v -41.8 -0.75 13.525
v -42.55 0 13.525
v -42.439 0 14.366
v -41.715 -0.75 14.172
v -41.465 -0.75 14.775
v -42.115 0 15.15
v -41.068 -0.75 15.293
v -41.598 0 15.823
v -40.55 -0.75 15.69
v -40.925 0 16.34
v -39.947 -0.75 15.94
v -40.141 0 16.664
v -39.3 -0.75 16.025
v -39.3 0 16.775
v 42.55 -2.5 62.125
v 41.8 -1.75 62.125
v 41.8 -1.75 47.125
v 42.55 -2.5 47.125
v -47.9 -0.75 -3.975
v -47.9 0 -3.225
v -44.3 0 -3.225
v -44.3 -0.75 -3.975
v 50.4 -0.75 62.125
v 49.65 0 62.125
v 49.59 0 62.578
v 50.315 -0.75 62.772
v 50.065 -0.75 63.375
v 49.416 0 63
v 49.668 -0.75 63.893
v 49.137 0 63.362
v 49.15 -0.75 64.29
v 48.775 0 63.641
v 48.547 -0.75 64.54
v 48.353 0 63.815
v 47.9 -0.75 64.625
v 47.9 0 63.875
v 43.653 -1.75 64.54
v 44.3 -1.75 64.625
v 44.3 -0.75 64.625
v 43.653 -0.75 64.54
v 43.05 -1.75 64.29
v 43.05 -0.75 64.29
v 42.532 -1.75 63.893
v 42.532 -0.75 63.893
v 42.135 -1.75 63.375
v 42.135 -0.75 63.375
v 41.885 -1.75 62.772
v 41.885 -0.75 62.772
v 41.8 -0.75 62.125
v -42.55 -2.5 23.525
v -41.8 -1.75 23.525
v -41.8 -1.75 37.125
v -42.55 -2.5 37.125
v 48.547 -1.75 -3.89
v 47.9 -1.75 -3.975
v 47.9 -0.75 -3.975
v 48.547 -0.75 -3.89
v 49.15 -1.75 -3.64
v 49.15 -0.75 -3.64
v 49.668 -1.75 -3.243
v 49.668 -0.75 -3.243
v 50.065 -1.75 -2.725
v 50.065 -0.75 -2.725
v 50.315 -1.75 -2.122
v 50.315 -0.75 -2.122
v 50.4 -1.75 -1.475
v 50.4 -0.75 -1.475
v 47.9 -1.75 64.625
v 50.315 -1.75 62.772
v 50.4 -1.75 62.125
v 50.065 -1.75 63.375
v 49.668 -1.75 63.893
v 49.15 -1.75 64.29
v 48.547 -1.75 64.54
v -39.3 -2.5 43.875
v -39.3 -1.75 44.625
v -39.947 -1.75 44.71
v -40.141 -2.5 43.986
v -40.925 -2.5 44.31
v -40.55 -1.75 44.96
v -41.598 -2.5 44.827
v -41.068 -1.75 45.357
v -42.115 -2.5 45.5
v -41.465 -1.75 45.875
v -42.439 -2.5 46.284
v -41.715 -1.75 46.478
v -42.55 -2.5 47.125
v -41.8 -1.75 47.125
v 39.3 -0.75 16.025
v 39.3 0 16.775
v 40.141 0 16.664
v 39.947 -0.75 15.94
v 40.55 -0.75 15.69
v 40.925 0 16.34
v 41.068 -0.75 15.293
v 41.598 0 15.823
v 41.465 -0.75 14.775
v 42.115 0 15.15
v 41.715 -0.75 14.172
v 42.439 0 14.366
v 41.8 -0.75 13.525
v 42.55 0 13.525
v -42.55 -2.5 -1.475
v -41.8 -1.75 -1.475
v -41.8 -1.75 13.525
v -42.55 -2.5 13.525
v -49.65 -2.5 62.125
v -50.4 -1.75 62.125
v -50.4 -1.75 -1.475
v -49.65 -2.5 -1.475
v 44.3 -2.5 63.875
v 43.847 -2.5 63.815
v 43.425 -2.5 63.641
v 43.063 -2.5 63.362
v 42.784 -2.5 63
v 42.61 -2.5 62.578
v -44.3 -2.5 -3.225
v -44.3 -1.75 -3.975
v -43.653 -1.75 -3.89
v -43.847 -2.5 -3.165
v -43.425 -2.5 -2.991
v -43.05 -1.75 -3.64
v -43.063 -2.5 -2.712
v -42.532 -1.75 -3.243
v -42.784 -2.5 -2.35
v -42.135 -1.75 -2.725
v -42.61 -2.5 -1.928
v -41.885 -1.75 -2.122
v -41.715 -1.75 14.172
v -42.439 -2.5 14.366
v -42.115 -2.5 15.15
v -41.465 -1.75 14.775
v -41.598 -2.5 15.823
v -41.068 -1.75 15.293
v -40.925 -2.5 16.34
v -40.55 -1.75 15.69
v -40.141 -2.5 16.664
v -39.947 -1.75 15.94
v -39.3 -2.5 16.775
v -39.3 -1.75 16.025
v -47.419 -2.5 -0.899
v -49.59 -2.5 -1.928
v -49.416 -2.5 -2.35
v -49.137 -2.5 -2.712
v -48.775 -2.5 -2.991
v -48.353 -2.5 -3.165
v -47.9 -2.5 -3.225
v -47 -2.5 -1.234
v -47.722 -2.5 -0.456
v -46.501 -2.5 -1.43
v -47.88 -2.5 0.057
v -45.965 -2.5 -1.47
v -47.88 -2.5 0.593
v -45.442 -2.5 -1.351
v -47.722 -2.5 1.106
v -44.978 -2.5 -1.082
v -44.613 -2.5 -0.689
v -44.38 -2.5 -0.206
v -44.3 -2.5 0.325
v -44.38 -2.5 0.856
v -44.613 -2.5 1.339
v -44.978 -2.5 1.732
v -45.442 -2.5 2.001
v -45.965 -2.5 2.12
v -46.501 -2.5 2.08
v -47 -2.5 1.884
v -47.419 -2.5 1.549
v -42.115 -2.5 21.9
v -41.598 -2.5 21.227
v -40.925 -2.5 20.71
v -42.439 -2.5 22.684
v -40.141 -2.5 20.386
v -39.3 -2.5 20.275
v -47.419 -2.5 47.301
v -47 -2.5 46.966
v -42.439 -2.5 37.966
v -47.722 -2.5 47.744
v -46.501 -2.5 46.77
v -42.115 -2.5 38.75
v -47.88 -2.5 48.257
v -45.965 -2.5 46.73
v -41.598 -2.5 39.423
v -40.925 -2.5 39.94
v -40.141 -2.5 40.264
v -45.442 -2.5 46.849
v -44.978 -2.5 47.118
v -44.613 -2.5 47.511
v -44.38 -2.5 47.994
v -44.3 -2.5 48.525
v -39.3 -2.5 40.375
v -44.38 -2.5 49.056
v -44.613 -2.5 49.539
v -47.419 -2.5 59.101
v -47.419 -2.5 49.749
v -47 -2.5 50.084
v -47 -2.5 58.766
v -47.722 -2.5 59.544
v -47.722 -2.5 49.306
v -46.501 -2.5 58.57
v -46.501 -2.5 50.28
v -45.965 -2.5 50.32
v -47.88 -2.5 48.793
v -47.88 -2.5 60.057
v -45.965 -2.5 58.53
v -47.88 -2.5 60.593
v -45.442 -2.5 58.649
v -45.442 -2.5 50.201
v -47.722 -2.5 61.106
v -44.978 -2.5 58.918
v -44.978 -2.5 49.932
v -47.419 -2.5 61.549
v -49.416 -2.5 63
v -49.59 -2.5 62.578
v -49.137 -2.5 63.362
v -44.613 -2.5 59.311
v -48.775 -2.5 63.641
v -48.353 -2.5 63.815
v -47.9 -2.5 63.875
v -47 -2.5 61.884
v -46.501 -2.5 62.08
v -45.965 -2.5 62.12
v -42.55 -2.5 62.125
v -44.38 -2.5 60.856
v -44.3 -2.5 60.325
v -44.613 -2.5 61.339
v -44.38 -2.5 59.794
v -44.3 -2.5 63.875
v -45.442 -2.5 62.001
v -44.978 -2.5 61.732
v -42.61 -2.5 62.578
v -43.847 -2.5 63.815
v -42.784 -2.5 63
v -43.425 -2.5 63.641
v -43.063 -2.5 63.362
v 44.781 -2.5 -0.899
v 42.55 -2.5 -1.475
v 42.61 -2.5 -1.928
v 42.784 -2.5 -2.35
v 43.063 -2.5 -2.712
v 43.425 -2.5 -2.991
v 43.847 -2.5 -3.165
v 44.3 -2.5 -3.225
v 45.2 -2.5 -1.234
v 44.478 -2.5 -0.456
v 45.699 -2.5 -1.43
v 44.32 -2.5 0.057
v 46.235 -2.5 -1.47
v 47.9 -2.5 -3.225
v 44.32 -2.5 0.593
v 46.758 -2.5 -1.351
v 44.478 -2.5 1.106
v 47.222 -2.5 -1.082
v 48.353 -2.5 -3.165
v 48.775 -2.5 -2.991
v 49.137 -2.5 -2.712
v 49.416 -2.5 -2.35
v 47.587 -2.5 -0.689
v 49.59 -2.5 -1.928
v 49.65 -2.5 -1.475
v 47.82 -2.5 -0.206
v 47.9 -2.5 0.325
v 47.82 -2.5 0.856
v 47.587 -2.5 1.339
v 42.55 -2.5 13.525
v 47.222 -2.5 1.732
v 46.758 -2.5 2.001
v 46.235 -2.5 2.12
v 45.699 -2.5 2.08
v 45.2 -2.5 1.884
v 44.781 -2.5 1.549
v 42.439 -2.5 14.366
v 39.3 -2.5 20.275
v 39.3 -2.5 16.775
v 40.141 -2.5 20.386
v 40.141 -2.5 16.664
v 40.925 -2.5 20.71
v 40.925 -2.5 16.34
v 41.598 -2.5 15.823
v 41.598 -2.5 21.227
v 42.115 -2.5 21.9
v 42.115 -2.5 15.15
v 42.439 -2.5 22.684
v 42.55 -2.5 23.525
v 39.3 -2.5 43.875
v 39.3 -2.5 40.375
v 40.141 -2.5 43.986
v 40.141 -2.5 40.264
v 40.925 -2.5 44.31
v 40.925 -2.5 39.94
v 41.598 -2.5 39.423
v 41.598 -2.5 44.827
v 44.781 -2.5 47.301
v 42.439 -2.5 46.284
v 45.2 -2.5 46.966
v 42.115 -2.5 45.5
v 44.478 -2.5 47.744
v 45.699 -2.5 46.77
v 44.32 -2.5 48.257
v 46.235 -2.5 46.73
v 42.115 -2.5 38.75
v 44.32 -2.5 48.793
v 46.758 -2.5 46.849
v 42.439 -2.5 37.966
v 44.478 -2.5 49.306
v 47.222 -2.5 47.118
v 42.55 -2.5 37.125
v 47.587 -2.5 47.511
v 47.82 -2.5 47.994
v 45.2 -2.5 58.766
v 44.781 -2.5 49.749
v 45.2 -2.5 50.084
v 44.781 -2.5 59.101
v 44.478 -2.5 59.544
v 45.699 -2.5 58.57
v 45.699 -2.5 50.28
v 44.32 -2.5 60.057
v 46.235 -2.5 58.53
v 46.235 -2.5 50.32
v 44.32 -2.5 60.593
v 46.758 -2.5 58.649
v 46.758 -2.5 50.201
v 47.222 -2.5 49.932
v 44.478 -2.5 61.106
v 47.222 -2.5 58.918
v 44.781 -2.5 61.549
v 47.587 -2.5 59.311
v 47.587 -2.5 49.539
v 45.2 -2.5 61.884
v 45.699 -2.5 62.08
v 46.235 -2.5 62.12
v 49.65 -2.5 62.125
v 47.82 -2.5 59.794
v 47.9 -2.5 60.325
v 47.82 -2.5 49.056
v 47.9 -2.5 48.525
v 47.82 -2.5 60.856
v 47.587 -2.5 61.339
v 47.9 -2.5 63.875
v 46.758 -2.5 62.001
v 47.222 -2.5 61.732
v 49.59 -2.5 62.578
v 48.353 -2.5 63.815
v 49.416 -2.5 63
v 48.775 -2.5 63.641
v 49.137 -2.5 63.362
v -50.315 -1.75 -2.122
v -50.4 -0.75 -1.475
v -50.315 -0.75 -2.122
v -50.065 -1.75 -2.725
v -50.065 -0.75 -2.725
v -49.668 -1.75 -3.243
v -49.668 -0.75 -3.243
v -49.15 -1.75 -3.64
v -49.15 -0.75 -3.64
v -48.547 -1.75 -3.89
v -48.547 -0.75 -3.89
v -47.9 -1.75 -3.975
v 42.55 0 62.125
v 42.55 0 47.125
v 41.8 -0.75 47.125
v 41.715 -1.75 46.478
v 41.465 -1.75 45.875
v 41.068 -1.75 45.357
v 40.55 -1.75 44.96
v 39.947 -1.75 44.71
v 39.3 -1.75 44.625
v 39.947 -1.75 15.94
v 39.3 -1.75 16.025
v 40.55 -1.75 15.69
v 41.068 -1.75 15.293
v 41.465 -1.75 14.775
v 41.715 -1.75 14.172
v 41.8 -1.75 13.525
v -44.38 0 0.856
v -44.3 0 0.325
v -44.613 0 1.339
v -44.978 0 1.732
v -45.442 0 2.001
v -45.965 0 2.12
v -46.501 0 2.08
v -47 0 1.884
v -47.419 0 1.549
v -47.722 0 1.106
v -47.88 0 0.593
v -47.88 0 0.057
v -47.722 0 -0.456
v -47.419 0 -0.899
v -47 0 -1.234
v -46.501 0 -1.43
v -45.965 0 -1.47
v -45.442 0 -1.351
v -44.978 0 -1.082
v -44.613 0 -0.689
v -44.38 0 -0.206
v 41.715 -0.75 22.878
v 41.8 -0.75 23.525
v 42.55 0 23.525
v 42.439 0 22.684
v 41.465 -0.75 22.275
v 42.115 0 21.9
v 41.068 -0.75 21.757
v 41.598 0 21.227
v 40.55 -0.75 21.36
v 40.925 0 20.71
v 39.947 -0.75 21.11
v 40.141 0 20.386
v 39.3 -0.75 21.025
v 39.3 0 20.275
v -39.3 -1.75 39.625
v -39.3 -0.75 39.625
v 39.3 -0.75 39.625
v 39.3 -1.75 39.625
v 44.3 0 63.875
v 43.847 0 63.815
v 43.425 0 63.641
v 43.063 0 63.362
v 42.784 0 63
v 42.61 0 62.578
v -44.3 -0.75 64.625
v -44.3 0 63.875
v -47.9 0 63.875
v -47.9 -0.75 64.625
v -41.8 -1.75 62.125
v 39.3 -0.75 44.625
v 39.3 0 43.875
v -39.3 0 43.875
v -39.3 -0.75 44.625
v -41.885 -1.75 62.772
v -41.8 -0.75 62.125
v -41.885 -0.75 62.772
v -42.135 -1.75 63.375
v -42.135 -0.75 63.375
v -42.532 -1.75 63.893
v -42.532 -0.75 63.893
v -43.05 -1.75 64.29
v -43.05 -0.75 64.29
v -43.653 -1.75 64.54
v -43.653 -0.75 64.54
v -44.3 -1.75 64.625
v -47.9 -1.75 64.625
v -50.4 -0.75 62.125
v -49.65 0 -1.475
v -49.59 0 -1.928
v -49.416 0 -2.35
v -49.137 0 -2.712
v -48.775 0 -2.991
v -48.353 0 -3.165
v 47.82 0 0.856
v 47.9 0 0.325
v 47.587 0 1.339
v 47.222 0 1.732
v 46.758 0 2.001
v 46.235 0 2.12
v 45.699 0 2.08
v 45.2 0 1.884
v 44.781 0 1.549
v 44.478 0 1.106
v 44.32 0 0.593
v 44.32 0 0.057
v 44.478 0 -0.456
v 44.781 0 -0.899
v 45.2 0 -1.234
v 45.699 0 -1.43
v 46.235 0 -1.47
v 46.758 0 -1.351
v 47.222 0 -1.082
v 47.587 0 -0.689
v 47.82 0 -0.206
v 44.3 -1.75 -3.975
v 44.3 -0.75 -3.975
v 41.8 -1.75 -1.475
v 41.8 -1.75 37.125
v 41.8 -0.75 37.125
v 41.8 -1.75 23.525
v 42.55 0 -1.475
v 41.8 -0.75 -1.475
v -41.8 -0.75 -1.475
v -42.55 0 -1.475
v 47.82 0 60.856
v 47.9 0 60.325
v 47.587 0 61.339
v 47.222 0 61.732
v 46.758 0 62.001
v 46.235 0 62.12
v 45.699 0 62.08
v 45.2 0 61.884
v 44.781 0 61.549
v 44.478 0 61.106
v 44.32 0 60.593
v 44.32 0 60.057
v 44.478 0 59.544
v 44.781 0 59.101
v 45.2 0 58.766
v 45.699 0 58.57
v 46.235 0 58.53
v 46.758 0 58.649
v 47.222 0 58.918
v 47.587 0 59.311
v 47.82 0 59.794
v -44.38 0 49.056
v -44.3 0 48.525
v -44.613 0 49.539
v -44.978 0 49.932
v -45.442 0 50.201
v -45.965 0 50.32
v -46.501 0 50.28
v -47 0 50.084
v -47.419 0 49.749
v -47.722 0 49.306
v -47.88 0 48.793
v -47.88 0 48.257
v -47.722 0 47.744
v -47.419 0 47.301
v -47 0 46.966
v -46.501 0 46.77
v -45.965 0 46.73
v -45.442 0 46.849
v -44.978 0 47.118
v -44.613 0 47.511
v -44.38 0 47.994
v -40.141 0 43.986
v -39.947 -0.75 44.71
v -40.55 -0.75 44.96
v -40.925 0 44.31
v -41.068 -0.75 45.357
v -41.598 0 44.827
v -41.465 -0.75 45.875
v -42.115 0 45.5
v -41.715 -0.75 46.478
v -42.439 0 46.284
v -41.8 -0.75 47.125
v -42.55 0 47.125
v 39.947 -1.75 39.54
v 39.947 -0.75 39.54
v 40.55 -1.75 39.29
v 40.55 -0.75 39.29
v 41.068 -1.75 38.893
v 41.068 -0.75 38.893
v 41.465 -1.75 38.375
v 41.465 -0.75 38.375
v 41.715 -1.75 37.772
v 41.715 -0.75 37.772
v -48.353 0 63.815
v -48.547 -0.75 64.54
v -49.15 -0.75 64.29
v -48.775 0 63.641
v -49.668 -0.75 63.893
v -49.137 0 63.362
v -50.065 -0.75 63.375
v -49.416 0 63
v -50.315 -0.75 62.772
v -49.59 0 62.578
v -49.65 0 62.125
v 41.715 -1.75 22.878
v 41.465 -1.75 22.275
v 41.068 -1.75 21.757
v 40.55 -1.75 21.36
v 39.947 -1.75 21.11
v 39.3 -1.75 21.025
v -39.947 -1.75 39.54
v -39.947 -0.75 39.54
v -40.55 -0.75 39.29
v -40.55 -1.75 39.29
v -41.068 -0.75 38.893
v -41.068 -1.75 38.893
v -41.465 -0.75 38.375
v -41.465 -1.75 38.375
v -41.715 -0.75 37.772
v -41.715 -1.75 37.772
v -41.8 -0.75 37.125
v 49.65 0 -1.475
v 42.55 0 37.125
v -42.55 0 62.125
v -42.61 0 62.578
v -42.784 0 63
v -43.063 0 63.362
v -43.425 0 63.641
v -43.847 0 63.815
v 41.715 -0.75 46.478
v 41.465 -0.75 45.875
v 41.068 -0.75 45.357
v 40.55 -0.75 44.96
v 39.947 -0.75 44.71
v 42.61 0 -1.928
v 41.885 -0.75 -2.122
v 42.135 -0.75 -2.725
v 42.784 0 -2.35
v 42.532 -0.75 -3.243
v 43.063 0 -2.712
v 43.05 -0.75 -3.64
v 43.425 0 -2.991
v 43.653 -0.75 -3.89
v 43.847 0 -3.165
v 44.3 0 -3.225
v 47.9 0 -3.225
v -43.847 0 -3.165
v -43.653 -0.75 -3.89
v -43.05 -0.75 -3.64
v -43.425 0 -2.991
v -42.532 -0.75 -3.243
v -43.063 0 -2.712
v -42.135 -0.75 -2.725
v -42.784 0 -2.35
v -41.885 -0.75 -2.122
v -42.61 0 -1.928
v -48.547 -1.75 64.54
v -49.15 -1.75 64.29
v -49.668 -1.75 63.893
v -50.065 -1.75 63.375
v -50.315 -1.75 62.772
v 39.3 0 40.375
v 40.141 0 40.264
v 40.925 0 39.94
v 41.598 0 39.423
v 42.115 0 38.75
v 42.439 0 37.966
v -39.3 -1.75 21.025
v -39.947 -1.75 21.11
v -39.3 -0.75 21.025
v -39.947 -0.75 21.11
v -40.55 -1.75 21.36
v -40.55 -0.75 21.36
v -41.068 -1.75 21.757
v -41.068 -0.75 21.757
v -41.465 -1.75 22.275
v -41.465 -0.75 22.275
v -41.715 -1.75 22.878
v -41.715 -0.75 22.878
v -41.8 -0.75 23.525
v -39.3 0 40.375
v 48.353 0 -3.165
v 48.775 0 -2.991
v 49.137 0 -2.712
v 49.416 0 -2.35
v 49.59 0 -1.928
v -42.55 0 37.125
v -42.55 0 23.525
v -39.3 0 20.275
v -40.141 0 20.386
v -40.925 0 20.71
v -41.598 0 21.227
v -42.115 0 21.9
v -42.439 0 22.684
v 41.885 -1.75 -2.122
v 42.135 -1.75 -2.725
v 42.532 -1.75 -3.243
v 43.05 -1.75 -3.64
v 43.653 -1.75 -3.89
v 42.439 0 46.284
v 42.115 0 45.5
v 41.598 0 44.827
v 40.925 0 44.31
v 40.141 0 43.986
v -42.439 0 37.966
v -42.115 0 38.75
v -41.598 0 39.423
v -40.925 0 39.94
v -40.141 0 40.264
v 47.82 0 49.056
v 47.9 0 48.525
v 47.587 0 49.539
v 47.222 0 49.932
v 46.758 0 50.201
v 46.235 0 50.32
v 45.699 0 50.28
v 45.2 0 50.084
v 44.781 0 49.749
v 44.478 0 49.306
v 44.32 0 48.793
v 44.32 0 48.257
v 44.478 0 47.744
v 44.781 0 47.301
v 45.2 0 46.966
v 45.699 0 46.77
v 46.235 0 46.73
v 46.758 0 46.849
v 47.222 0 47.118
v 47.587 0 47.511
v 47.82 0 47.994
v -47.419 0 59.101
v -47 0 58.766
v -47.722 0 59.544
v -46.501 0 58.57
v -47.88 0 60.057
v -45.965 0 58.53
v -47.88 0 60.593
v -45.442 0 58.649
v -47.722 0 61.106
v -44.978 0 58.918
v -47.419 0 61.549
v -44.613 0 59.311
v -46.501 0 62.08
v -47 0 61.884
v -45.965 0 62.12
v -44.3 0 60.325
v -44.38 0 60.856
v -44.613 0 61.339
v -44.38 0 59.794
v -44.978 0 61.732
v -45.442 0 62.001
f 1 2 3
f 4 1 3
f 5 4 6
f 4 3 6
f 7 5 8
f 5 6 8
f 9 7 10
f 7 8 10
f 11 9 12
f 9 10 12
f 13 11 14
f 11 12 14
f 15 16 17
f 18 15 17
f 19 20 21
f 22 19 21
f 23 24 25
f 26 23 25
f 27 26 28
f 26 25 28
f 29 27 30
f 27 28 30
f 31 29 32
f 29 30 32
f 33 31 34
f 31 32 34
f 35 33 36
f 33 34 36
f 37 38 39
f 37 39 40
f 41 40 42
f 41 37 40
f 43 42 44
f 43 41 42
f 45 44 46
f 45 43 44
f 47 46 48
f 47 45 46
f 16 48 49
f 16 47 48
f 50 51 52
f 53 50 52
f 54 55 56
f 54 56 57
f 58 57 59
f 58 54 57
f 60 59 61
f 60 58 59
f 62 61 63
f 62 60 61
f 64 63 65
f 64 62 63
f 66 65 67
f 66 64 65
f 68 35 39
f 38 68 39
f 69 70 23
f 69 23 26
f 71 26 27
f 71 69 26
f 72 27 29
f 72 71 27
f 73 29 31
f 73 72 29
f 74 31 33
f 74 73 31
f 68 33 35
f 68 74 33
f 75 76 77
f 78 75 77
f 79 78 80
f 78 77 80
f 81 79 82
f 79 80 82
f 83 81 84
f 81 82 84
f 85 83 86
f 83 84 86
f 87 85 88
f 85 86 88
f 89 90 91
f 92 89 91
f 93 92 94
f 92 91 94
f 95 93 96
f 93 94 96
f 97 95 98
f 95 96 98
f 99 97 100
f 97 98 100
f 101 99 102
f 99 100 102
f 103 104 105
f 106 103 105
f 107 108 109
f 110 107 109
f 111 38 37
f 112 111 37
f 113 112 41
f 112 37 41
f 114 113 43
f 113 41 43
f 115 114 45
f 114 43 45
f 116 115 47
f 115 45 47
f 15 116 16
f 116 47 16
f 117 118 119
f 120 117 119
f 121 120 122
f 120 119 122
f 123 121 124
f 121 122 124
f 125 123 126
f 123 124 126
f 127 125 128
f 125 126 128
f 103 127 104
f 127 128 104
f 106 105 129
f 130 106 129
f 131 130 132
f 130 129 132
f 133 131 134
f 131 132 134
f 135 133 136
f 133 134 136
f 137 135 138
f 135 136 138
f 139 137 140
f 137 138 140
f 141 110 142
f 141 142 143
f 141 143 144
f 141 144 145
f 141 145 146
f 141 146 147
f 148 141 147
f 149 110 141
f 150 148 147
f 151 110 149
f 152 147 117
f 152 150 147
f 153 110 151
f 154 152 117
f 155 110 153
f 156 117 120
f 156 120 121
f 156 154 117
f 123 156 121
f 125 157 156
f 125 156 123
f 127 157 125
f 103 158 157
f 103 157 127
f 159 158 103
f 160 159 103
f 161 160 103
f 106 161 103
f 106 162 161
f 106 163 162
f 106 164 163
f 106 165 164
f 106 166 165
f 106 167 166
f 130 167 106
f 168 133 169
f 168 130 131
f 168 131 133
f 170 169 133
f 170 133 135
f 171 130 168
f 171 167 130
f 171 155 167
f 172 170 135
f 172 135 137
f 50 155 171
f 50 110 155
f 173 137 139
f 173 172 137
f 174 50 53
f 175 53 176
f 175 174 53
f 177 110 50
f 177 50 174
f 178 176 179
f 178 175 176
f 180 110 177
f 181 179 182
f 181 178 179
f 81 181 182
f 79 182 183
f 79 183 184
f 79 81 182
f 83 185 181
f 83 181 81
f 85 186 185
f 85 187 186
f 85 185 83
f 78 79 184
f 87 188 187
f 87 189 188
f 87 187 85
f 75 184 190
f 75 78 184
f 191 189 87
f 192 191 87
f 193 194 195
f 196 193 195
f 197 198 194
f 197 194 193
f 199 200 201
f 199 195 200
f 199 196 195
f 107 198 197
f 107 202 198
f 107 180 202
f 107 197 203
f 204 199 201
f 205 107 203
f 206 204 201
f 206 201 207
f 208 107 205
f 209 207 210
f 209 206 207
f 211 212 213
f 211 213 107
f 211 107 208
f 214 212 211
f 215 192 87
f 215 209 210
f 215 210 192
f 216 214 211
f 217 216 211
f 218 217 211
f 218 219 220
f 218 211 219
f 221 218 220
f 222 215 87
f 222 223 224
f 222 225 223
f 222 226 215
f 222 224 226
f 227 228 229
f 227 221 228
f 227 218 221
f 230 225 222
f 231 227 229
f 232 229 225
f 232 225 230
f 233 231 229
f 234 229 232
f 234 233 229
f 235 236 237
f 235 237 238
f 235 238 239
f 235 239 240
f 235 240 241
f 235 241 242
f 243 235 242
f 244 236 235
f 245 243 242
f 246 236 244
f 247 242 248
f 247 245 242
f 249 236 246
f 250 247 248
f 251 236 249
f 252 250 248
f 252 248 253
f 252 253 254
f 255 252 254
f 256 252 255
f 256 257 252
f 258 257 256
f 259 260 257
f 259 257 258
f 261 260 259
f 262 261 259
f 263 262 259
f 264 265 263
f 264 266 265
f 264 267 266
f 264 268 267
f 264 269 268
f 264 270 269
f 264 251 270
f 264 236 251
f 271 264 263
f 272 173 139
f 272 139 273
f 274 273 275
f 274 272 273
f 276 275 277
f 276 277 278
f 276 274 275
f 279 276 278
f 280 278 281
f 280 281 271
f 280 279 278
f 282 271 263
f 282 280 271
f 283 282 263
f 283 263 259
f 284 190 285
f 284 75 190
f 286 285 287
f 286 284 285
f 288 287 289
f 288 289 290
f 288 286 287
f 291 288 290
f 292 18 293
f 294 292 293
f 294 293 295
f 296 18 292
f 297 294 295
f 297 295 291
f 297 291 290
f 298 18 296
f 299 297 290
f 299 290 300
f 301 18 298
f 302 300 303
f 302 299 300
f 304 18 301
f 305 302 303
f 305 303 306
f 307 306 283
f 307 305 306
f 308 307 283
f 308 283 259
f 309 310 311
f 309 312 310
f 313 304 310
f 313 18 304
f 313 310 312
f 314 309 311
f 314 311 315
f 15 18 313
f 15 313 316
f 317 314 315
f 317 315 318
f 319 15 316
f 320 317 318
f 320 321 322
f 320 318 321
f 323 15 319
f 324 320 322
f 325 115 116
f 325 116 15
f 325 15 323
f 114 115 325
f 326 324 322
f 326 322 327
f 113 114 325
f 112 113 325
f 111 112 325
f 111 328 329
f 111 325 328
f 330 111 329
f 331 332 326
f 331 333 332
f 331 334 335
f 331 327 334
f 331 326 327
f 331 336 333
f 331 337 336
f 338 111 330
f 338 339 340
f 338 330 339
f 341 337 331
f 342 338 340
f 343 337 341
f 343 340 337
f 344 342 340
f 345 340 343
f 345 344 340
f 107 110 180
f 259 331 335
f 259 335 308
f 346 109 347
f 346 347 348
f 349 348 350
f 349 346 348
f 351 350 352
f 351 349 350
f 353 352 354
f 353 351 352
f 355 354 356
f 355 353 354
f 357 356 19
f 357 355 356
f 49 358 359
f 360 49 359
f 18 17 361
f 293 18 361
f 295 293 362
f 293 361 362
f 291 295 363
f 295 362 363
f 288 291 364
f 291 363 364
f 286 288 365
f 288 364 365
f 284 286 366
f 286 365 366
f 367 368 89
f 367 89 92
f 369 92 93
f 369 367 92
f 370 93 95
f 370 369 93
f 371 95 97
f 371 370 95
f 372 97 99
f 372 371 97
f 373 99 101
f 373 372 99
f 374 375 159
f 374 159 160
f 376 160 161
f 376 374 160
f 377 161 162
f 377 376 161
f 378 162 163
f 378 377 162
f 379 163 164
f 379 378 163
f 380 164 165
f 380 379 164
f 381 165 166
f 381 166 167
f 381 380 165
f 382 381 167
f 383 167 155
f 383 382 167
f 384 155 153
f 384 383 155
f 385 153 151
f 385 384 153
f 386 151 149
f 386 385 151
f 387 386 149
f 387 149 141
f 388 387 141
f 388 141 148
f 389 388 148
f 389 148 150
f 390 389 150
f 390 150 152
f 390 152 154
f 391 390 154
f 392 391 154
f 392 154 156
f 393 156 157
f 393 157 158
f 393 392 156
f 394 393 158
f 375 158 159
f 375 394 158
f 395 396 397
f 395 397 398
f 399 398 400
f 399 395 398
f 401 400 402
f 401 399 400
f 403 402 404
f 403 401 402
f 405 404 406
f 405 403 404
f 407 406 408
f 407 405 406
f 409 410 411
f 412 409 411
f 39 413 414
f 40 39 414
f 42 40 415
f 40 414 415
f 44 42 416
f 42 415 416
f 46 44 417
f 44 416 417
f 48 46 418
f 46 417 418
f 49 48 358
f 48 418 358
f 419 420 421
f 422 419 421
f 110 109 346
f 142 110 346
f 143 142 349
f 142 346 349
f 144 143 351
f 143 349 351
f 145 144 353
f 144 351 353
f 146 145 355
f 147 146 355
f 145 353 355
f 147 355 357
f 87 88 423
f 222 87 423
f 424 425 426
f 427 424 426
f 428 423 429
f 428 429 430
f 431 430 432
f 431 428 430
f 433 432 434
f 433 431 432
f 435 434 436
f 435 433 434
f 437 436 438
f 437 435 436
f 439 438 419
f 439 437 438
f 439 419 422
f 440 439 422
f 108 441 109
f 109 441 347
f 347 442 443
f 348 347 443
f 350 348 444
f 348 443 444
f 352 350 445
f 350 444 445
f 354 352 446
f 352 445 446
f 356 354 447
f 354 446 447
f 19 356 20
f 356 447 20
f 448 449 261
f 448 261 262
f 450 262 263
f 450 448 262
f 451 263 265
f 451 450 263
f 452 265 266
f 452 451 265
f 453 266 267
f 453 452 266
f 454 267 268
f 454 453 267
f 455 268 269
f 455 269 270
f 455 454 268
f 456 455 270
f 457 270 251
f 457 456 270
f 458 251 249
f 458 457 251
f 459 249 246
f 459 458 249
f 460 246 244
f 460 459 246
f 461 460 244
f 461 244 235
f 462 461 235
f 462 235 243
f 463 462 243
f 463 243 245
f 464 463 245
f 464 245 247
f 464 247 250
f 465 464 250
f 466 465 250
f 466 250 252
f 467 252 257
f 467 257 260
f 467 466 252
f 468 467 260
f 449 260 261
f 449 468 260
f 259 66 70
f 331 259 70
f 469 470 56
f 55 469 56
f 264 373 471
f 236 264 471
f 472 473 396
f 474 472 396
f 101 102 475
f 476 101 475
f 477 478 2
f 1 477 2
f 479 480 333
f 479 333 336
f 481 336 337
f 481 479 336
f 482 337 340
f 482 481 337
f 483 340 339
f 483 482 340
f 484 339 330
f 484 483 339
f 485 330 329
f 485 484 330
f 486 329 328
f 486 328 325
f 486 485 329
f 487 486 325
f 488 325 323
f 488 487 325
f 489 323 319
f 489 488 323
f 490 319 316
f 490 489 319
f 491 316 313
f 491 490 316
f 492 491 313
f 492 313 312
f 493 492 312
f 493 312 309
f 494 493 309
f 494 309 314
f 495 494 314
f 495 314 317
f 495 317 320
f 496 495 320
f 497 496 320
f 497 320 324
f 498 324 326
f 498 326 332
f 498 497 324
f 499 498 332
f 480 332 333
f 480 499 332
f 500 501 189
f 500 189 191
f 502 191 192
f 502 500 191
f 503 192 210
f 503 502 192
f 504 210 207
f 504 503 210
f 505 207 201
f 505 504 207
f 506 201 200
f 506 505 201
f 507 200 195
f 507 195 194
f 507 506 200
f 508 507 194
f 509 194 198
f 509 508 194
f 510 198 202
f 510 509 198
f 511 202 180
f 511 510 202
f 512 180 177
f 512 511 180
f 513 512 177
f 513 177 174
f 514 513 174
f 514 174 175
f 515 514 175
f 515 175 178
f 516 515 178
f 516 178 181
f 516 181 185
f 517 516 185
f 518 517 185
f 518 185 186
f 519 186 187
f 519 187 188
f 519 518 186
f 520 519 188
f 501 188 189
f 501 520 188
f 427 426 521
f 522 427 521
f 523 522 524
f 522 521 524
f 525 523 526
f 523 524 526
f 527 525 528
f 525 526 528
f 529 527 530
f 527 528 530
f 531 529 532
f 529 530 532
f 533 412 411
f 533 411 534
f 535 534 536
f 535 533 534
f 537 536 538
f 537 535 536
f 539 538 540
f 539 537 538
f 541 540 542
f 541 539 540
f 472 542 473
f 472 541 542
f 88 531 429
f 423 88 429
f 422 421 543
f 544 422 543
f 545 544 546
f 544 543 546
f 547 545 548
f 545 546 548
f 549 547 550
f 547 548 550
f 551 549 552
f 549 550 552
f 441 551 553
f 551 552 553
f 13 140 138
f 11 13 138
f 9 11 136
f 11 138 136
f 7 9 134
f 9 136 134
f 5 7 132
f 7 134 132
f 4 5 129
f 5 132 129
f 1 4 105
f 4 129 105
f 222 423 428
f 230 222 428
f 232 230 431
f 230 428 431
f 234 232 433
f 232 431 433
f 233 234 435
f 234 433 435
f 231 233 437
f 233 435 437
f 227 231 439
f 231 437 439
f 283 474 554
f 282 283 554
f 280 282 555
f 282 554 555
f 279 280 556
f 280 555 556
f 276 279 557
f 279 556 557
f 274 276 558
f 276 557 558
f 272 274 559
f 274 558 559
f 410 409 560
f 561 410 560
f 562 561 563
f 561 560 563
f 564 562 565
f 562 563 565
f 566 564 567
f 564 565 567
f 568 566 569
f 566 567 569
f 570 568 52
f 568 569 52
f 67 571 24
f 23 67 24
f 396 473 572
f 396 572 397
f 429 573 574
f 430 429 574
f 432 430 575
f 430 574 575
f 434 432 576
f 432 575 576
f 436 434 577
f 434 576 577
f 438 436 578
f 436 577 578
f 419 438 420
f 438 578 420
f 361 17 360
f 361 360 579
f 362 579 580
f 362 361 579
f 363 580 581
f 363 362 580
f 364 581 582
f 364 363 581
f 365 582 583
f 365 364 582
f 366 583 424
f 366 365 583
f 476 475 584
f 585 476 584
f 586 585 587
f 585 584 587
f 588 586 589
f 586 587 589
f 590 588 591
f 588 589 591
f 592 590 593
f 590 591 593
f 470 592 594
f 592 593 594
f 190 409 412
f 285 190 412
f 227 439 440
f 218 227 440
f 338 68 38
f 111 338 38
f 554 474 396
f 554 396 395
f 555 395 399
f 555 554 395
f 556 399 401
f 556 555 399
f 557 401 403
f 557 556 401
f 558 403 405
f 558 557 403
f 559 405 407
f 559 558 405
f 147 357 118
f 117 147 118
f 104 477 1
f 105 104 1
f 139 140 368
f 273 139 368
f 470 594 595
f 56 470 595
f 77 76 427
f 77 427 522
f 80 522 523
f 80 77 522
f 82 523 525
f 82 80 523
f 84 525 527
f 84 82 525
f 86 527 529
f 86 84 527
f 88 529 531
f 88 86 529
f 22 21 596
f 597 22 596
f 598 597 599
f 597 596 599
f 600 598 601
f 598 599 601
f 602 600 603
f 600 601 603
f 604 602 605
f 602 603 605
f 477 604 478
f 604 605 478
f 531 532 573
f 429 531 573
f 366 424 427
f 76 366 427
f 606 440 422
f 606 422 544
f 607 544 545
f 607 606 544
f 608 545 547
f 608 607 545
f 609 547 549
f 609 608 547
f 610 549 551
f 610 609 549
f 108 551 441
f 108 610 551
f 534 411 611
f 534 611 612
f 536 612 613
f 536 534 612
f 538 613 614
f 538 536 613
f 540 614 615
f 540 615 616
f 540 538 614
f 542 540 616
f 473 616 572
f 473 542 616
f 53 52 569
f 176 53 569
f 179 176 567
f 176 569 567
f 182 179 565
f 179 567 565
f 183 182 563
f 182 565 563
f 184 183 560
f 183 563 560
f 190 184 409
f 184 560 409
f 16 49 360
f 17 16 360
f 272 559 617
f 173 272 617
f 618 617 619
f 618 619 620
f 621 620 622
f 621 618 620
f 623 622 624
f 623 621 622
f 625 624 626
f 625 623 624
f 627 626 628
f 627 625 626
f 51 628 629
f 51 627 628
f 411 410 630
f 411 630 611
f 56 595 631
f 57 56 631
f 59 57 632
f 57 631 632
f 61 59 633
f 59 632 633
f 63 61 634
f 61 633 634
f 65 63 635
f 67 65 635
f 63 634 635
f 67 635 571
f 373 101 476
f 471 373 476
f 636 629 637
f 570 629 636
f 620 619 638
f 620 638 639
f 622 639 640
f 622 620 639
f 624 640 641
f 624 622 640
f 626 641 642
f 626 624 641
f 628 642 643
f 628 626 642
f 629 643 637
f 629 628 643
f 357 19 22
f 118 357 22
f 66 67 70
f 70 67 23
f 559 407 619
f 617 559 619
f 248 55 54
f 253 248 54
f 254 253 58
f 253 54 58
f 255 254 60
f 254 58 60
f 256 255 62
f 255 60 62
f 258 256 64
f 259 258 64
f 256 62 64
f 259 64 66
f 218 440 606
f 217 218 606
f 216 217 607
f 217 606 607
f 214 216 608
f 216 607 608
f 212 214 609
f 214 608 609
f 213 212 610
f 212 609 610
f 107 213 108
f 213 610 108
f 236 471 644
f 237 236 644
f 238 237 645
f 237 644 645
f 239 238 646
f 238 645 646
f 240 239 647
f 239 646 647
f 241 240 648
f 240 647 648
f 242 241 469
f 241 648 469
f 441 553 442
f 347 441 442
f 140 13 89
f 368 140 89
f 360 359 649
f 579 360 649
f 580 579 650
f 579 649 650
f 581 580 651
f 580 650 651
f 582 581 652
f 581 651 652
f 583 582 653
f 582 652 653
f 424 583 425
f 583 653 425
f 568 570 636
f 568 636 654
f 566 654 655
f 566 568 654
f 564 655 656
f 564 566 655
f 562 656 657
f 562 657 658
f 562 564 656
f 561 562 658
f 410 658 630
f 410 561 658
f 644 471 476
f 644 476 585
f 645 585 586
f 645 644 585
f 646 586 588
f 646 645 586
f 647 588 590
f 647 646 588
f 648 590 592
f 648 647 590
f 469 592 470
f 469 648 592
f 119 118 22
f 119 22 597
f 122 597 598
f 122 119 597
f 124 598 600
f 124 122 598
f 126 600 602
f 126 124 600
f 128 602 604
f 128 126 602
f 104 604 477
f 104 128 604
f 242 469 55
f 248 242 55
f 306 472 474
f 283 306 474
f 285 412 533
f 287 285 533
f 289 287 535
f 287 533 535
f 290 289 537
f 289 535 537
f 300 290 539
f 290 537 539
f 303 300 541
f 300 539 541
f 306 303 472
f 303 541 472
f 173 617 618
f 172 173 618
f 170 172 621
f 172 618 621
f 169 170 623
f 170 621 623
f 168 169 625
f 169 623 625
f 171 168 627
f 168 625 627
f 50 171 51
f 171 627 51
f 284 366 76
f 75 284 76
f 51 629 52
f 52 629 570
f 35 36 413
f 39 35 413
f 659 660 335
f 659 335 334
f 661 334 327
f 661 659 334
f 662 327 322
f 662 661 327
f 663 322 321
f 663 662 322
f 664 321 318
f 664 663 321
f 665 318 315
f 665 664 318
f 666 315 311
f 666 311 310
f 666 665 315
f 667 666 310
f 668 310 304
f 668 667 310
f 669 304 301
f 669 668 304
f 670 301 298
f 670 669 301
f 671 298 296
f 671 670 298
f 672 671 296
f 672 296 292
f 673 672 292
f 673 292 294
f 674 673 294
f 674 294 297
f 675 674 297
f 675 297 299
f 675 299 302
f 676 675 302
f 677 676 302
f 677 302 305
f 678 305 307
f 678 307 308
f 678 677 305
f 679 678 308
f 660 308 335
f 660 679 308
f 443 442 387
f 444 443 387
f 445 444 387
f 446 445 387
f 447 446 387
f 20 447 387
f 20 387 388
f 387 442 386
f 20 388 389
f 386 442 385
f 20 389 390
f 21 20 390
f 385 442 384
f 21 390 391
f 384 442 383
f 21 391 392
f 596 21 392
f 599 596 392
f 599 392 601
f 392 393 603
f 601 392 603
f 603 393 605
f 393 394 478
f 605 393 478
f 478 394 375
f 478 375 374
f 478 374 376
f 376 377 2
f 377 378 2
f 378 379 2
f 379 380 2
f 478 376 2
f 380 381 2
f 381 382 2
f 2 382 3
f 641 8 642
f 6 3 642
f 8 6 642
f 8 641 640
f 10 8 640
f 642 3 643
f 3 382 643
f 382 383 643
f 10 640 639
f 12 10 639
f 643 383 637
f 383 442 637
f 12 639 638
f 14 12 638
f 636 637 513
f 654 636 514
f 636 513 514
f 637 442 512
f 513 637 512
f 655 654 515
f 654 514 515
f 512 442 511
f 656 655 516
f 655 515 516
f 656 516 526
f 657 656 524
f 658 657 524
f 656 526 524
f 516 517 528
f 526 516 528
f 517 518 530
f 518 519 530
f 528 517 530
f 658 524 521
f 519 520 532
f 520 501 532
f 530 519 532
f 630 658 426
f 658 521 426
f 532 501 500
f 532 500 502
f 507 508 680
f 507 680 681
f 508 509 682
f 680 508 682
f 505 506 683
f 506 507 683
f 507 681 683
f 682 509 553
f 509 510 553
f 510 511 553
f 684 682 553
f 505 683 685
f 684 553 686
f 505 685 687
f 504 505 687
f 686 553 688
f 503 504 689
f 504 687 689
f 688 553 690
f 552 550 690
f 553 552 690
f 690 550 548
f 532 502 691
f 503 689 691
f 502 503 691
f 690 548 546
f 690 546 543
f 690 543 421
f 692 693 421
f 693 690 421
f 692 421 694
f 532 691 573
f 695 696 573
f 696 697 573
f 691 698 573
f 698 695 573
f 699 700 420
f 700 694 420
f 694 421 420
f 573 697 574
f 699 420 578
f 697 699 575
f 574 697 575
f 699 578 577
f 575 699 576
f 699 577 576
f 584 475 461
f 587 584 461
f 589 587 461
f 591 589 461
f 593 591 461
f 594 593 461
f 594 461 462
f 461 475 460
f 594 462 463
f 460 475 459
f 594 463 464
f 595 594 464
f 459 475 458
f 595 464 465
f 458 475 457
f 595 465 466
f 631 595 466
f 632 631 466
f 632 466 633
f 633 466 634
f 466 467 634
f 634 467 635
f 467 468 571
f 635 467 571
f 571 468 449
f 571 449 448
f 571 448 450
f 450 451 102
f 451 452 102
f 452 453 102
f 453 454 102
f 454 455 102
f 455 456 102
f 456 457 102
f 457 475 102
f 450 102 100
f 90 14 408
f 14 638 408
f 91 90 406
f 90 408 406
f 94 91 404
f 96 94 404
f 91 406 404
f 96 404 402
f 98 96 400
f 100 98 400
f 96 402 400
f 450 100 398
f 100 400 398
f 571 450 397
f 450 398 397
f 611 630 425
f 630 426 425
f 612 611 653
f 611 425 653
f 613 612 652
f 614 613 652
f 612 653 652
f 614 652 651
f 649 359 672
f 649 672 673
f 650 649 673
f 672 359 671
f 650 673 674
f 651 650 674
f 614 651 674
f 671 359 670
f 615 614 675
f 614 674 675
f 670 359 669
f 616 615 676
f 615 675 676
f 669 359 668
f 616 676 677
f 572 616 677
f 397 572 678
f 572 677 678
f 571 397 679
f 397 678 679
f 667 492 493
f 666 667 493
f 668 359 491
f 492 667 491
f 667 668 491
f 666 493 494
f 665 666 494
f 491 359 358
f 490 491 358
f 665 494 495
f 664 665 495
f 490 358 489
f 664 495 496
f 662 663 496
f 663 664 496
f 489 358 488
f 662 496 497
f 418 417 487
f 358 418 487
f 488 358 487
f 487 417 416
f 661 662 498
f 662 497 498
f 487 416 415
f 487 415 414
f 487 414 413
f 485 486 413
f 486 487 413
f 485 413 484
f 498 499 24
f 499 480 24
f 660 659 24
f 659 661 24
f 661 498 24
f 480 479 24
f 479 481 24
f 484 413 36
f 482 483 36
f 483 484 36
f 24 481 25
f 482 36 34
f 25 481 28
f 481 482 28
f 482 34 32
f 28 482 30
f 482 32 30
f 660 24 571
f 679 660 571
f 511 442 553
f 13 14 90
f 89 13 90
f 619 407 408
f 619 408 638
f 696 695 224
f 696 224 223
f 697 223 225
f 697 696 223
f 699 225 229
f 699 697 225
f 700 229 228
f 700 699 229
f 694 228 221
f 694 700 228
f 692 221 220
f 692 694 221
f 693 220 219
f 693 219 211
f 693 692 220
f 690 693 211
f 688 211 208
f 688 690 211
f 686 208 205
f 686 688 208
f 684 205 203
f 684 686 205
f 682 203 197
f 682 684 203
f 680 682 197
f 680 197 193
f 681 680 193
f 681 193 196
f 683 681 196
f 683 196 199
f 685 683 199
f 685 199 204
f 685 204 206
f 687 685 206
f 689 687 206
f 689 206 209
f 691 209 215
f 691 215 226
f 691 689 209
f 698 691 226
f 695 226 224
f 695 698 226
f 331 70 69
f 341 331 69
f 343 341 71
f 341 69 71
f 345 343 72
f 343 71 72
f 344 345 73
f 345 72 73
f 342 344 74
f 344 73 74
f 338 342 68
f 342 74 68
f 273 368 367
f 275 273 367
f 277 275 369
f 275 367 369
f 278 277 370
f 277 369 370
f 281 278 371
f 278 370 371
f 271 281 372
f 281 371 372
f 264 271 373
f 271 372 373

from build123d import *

# Parameters (mm, degrees)
F0_W     = 0.0285906434
F0_H     = 5
F0_W_2   = 41.8
F0_R     = 1.8
F1_DEPTH = 2.5
F2_R     = 2.5
F3_SIZE  = 0.75


# Not quite as in the source:
# - a feature names something its author has since deleted; it is built from what else it names


with BuildPart() as f1:
    # F0 (on Front) → F1 (new body)
    with BuildSketch(Plane.XZ):
        with Locations((-41.8142953217, 18.525)):
            Rectangle(F0_W, F0_H)
        with Locations((41.8142953217, 18.525)):
            Rectangle(F0_W, F0_H)
        with Locations((-20.9, 18.525)):
            Rectangle(F0_W_2, F0_H)
        with Locations((20.9, 18.525)):
            Rectangle(F0_W_2, F0_H)
        with Locations((20.9, 42.125)):
            Rectangle(F0_W_2, F0_H)
        Polygon((41.8, 64.625), (41.8, 44.625), (41.8, 39.625), (41.8, 21.025), (41.8285906434, 21.025), (41.8285906434, 16.025), (41.8, 16.025), (41.8, -3.975), (50.4, -3.975), (50.4, 64.625), align=None)
        with Locations((46.1, 0.325)):
            Circle(F0_R, mode=Mode.SUBTRACT)
        with Locations((46.1, 48.525)):
            Circle(F0_R, mode=Mode.SUBTRACT)
        with Locations((46.1, 60.325)):
            Circle(F0_R, mode=Mode.SUBTRACT)
        with Locations((-20.9, 42.125)):
            Rectangle(F0_W_2, F0_H)
        Polygon((-41.8, 64.625), (-50.4, 64.625), (-50.4, -3.975), (-41.8, -3.975), (-41.8, 16.025), (-41.8285906434, 16.025), (-41.8285906434, 21.025), (-41.8, 21.025), (-41.8, 39.625), (-41.8, 44.625), align=None)
        with Locations((-46.1, 0.325)):
            Circle(F0_R, mode=Mode.SUBTRACT)
        with Locations((-46.1, 48.525)):
            Circle(F0_R, mode=Mode.SUBTRACT)
        with Locations((-46.1, 60.325)):
            Circle(F0_R, mode=Mode.SUBTRACT)
    extrude(amount=F1_DEPTH)

    # F2
    f2_edges = [f1.edges().sort_by_distance(p)[0] for p in [
        (-41.8, -1.25, 44.625),
        (41.8, -1.25, 44.625),
        (-41.8, -1.25, 39.625),
        (41.8, -1.25, 39.625),
        (-41.8, -1.25, 21.025),
        (41.8, -1.25, 21.025),
        (-41.8, -1.25, 16.025),
        (41.8, -1.25, 16.025),
        (41.8, -1.25, -3.975),
        (50.4, -1.25, -3.975),
        (-50.4, -1.25, -3.975),
        (-41.8, -1.25, -3.975),
        (50.4, -1.25, 64.625),
        (41.8, -1.25, 64.625),
        (-50.4, -1.25, 64.625),
        (-41.8, -1.25, 64.625),
    ]]
    fillet(f2_edges, radius=F2_R)

    # F3
    f3_edges = [f1.edges().sort_by_distance(p)[0] for p in [
        (0, 0, 16.025),
        (0, 0, 39.625),
        (-46.1, -2.5, 64.625),
        (0, -2.5, 39.625),
    ]]
    chamfer(f3_edges, length=F3_SIZE)


solid = f1.part
